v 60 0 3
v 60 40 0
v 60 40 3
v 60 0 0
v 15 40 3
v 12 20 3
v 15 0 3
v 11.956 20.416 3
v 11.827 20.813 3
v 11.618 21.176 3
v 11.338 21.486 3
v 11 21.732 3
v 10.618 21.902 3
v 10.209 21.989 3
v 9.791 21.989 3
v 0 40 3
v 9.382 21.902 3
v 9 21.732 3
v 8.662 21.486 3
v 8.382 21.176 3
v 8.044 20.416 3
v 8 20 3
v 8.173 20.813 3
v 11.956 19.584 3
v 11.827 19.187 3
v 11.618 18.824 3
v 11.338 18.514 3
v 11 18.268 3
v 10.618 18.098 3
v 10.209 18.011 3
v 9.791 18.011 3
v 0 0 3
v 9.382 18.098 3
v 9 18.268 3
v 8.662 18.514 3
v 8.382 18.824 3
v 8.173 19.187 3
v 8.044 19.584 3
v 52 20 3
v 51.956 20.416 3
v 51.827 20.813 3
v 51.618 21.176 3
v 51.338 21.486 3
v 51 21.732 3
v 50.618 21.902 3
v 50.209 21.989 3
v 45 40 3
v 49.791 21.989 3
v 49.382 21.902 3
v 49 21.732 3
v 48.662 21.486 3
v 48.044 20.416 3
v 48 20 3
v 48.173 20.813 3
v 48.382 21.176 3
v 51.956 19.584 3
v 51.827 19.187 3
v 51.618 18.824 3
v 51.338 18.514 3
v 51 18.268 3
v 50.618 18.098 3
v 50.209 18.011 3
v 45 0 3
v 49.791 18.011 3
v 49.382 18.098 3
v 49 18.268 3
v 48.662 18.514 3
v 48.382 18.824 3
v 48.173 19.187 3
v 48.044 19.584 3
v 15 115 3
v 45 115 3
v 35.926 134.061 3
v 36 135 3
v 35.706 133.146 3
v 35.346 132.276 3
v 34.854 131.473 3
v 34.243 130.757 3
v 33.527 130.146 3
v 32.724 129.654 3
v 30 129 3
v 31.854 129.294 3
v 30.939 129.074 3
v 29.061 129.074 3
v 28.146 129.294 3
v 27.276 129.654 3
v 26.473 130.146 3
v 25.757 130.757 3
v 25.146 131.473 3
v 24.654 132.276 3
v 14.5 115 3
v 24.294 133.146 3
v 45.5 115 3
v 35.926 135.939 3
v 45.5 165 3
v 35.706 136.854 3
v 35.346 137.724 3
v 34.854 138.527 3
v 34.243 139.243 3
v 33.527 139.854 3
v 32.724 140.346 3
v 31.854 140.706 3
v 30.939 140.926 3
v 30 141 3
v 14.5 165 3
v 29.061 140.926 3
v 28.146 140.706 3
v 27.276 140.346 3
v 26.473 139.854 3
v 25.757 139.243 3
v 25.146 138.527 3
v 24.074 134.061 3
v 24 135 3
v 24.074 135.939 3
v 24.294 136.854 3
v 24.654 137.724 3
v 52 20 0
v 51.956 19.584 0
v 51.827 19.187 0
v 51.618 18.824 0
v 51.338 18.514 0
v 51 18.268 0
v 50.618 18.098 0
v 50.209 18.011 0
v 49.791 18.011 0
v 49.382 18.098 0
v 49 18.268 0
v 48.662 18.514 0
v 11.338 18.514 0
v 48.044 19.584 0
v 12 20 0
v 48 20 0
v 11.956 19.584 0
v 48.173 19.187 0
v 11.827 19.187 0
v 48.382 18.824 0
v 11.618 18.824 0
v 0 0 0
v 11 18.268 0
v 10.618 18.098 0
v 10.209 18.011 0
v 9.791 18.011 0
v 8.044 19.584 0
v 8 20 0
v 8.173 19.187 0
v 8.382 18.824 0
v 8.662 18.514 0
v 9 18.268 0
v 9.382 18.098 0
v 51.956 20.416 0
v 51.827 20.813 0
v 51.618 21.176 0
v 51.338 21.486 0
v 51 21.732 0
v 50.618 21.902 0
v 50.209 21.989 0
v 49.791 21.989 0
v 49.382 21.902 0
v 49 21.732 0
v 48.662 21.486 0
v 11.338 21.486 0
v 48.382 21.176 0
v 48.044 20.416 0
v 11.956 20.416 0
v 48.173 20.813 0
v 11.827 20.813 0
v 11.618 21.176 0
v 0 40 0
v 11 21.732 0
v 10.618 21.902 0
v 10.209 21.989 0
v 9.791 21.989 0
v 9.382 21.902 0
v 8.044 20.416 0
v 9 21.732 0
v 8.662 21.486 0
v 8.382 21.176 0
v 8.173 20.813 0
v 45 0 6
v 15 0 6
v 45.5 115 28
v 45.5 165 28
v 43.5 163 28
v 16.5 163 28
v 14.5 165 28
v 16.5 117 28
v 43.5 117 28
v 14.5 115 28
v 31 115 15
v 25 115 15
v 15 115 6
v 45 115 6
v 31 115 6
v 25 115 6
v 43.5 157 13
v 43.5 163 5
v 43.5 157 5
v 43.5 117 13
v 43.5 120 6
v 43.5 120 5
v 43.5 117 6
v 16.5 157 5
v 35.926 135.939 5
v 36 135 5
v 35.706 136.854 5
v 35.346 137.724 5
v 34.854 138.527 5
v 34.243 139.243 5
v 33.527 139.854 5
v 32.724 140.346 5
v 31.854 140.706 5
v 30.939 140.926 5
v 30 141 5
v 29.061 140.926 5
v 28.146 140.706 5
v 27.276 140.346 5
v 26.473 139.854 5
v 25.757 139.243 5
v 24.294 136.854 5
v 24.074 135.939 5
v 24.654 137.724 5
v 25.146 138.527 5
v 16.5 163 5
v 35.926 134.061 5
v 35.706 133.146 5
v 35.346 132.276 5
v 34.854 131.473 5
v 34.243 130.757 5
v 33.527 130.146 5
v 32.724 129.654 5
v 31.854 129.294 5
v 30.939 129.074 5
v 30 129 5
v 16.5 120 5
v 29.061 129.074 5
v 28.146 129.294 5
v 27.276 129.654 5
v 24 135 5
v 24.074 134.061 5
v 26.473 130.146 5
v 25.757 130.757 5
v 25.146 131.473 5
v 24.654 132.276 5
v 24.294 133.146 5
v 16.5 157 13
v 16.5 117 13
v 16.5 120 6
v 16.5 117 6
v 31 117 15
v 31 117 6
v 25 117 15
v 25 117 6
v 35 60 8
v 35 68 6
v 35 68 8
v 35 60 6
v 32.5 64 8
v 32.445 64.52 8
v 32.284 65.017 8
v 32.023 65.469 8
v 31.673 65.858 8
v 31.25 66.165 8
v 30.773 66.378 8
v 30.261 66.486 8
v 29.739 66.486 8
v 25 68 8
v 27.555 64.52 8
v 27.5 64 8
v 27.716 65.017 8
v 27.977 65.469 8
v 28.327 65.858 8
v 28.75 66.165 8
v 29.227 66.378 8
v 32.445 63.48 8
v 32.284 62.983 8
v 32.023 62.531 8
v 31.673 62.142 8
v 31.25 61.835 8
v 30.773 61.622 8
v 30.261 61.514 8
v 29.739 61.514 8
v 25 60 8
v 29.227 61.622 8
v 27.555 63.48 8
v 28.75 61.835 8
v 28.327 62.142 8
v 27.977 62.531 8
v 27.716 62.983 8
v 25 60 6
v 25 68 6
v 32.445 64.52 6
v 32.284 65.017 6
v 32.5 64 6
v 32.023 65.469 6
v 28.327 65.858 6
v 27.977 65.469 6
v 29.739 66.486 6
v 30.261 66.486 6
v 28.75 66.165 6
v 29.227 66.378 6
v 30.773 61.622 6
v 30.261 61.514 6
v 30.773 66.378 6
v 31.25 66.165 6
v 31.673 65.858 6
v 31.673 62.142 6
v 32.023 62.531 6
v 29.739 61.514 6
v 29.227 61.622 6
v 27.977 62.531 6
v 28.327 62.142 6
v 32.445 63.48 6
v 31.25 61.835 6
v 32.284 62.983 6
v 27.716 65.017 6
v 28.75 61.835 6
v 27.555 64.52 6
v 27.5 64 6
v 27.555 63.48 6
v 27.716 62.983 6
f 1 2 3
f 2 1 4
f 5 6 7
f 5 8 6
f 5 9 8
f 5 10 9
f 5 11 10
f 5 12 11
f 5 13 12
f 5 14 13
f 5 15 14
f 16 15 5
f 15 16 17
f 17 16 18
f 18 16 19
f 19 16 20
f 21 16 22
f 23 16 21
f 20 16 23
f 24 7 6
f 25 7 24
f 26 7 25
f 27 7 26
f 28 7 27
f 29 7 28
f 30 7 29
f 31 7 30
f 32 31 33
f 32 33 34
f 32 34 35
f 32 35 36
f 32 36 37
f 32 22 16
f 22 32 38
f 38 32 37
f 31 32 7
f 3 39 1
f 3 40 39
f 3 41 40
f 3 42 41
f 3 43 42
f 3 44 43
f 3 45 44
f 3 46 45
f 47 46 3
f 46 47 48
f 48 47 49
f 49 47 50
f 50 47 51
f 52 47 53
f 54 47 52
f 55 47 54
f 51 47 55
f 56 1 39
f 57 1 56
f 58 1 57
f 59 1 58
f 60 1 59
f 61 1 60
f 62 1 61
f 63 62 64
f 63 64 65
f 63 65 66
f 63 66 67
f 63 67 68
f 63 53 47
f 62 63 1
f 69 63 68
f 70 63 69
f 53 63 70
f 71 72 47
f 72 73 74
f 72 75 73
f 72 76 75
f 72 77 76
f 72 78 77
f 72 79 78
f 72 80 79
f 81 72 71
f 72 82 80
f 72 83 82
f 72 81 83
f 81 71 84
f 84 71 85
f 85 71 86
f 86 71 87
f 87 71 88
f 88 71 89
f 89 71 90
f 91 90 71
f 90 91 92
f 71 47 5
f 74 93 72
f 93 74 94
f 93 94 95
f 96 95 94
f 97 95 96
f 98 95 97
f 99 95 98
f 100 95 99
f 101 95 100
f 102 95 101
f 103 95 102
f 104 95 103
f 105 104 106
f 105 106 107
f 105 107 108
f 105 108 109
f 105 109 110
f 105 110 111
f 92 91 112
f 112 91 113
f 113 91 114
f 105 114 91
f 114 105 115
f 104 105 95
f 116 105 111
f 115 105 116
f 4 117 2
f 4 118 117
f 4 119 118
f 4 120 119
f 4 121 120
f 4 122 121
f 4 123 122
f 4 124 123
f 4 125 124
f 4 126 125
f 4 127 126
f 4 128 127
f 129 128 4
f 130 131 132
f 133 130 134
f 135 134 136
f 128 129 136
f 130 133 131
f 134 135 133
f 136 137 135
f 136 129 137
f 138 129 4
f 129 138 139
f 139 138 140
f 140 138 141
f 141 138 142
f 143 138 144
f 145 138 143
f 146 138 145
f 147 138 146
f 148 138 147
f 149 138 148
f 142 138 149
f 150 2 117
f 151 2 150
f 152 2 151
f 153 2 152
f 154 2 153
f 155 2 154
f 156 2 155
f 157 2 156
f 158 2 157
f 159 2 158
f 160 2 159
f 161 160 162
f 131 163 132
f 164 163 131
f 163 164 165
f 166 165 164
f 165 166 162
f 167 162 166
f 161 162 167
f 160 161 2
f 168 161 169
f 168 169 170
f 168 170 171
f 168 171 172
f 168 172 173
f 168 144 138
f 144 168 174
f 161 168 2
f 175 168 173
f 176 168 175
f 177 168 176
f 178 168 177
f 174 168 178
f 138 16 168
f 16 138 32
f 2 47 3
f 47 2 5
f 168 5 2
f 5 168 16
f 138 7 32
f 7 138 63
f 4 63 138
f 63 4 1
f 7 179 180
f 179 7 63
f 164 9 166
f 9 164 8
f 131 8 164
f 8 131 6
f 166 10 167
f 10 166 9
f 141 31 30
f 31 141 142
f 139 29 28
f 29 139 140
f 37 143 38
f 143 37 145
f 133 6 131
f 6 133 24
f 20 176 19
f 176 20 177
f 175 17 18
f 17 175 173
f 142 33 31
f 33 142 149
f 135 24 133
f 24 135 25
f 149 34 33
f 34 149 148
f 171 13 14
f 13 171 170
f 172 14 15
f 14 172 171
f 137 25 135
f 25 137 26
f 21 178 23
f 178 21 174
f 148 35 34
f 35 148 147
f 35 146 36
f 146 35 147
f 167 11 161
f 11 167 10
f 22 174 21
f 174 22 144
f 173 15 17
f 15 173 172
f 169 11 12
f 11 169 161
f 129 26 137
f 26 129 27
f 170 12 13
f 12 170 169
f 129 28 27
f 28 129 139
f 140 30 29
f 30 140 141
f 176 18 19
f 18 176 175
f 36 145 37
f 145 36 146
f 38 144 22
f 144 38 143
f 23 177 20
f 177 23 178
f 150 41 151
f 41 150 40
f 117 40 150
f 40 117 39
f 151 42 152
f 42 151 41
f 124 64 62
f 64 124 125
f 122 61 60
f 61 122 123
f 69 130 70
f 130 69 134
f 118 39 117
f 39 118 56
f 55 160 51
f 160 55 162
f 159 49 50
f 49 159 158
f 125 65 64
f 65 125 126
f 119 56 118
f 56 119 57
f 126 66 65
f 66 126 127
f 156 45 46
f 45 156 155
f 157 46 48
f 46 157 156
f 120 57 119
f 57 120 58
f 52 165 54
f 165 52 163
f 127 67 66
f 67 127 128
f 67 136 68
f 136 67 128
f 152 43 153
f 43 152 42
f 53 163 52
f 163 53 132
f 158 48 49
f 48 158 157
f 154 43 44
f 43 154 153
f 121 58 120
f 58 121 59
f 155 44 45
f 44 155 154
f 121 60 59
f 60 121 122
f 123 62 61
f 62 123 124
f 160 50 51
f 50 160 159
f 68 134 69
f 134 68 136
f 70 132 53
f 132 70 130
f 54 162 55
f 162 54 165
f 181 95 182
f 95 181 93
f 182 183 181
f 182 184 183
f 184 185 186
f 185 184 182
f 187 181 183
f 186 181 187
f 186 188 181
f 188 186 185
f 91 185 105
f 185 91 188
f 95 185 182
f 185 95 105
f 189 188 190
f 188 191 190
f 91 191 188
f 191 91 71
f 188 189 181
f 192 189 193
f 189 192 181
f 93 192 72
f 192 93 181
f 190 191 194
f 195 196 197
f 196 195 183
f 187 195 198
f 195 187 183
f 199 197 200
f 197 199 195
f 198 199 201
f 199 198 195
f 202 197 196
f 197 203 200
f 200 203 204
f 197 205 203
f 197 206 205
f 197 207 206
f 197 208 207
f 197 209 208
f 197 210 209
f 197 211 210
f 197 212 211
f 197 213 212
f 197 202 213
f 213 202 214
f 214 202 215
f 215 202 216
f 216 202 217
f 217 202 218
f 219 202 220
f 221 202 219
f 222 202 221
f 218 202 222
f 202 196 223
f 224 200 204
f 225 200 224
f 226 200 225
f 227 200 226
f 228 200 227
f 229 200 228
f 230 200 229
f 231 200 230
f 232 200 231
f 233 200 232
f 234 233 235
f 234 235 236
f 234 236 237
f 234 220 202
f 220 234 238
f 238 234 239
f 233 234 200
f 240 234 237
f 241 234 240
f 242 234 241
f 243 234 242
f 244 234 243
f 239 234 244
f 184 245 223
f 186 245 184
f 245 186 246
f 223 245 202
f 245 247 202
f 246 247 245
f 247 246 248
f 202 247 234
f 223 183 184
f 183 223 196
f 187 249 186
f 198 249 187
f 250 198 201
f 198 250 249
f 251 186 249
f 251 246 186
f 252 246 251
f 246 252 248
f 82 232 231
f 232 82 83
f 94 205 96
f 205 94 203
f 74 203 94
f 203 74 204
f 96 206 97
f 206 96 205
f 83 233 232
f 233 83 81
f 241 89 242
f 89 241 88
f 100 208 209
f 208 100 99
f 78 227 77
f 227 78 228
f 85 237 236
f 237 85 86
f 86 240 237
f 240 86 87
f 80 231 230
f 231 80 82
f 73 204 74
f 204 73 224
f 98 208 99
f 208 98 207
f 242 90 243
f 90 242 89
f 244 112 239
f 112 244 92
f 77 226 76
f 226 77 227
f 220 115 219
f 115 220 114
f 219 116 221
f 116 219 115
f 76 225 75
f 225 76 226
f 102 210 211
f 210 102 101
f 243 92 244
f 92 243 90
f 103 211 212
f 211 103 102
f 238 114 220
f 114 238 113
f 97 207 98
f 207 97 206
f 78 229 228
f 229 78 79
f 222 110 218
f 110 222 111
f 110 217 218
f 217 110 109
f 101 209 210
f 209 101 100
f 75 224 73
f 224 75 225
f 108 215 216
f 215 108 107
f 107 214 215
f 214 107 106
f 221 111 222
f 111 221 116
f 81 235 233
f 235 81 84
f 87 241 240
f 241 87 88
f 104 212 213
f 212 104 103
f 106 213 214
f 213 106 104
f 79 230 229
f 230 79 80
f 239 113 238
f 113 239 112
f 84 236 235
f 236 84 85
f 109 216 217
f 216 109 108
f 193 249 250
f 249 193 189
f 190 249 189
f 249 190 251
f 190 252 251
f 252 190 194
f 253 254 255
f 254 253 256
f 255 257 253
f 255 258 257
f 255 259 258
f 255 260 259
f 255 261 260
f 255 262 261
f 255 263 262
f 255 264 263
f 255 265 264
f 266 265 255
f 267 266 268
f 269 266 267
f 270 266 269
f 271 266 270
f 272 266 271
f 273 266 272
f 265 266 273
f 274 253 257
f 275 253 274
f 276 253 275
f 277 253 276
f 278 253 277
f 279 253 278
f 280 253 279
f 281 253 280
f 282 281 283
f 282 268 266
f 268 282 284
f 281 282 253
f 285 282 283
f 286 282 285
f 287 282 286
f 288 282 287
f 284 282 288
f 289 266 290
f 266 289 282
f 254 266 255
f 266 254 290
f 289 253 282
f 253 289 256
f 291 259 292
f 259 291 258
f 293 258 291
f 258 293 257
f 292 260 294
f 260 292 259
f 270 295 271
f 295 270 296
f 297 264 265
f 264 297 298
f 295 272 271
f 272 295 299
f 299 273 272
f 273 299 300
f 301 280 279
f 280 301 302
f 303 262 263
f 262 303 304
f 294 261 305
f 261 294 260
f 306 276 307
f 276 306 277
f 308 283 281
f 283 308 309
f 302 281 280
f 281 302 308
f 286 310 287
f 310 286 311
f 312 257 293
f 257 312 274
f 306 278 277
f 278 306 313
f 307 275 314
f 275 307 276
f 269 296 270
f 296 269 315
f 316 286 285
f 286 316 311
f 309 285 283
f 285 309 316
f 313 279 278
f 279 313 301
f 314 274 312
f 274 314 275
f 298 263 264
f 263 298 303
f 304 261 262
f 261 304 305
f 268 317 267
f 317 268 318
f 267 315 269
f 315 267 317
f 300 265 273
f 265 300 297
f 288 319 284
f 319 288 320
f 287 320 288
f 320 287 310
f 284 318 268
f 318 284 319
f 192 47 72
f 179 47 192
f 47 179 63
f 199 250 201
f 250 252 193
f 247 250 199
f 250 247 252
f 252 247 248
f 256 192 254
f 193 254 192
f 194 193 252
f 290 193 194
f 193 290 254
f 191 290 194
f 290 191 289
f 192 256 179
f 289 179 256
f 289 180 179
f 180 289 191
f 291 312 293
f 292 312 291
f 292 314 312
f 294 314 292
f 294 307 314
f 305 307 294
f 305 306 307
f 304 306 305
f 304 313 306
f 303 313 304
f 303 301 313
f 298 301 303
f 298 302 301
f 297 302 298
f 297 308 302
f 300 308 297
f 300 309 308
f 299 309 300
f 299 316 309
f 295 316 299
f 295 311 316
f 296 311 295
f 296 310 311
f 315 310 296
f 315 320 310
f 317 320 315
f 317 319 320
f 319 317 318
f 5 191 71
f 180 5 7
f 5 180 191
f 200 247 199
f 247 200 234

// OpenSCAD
// ESP32-CAM Water Meter Mount
// Adjustable camera distance and angle for DIY water meter reader
// Part of Home Assistant Phase 3 project
//
// Usage:
// 1. Measure distance from wall to water meter (typical: 100-150mm)
// 2. Adjust camera_distance parameter below
// 3. Render (F6) → Export as STL (F7)
// 4. Slice and print (PLA, 20% infill, supports enabled)
//
// Print time: ~3 hours
// Material: ~30g PLA
// Supports: Yes (for camera holder overhang)

// ===== PARAMETERS - ADJUST THESE =====
camera_distance = 120;  // Distance from mounting surface to meter (mm)
                        // Measure your setup and adjust: typically 100-150mm
mounting_width = 60;    // Width of mounting base (mm)
mounting_depth = 40;    // Depth of mounting base (mm)
wall_thickness = 3;     // Wall thickness (mm) - don't change unless needed

// ESP32-CAM board dimensions (standard - don't change)
board_width = 27;       // Width of ESP32-CAM board
board_length = 40;      // Length of ESP32-CAM board
board_height = 1.6;     // PCB thickness

// LED ring parameters (optional - for low-light conditions)
led_ring_diameter = 44;     // For 12-LED ring (standard size)
led_ring_thickness = 2;     // Thickness of LED ring holder

// ===== MODULES =====

// Main mounting bracket
// This is the base that attaches to wall or meter box
module mounting_base() {
    difference() {
        // Base plate
        cube([mounting_width, mounting_depth, wall_thickness]);

        // Mounting holes (for screws - M4 size)
        // Left hole
        translate([10, mounting_depth/2, -1])
            cylinder(h=wall_thickness+2, r=2, $fn=30);
        // Right hole
        translate([mounting_width-10, mounting_depth/2, -1])
            cylinder(h=wall_thickness+2, r=2, $fn=30);
    }
}

// Camera arm (extends toward meter)
// This connects the base to the camera holder
module camera_arm() {
    translate([mounting_width/2 - 15, 0, wall_thickness]) {
        cube([30, camera_distance, wall_thickness]);
    }
}

// ESP32-CAM holder
// Holds the ESP32-CAM board securely
module camera_holder() {
    translate([mounting_width/2 - board_width/2 - 2, camera_distance - 5, wall_thickness]) {
        difference() {
            // Outer box
            cube([board_width + 4, board_length + 10, 25]);

            // Inner cavity for board
            translate([2, 2, 2])
                cube([board_width, board_length + 6, 23]);

            // Camera lens opening (centered on board)
            translate([board_width/2 + 2, board_length/2, -1])
                cylinder(h=4, r=6, $fn=40);

            // USB-C cable slot at bottom
            translate([board_width/2 - 3, -1, 2])
                cube([6, 3, 10]);
        }

        // Side grips to hold board in place
        // Left grip
        translate([1, 2, 2])
            cube([1, board_length, 8]);
        // Right grip
        translate([board_width + 2, 2, 2])
            cube([1, board_length, 8]);
    }
}

// LED ring holder (optional - uncomment in assembly if needed)
// Provides illumination for low-light conditions
module led_ring_holder() {
    translate([mounting_width/2, camera_distance, wall_thickness + 12]) {
        difference() {
            // Outer ring
            cylinder(h=led_ring_thickness, r=led_ring_diameter/2 + 2, $fn=60);
            // Inner cutout for LEDs
            translate([0, 0, -1])
                cylinder(h=led_ring_thickness + 2, r=led_ring_diameter/2, $fn=60);

            // Wire slot for LED power cable
            translate([-2, led_ring_diameter/2 - 5, -1])
                cube([4, 10, led_ring_thickness + 2]);
        }
    }
}

// Cable management clip
// Keeps USB-C power cable organized
module cable_clip() {
    translate([mounting_width/2 - 5, camera_distance/2, wall_thickness]) {
        difference() {
            cube([10, 8, 5]);
            // Cable channel (for USB-C cable)
            translate([5, 4, 2])
                rotate([0, 0, 0])
                    cylinder(h=4, r=2.5, $fn=30);
        }
    }
}

// ===== ASSEMBLY =====
// Main components (always included)
mounting_base();
camera_arm();
camera_holder();
cable_clip();

// Optional components (uncomment if needed)
// Uncomment the line below if using LED ring for illumination:
// led_ring_holder();

// ===== NOTES =====
//
// Mounting options:
// 1. Wall mount: Use M4 screws through mounting holes
// 2. Double-sided tape: For rental properties or non-permanent install
// 3. Custom clips: Modify mounting_base() to add clips for your meter box
//
// Print settings:
// - Layer height: 0.2mm
// - Infill: 20%
// - Supports: Yes (needed for camera holder overhang)
// - Material: PLA (sufficient for indoor use)
// - Print time: ~3 hours
// - Weight: ~30g
//
// Assembly:
// 1. Print this mount
// 2. Insert ESP32-CAM into camera holder (slides in from top)
// 3. Route USB-C cable through cable clip
// 4. Position mount so camera is 10-15cm from meter face
// 5. Ensure meter dials are centered in camera view
// 6. Secure mount to wall or meter box
// 7. Connect USB-C power
//
// Troubleshooting:
// - If board doesn't fit: Check board_width and board_length measurements
// - If mount is wobbly: Increase wall_thickness or add more mounting holes
// - If camera angle is wrong: Adjust camera_distance parameter
//
// Part of: Home Automation Phase 3 - DIY Water Meter Reader
// See: /docs/water-meter-setup.md for full setup instructions
